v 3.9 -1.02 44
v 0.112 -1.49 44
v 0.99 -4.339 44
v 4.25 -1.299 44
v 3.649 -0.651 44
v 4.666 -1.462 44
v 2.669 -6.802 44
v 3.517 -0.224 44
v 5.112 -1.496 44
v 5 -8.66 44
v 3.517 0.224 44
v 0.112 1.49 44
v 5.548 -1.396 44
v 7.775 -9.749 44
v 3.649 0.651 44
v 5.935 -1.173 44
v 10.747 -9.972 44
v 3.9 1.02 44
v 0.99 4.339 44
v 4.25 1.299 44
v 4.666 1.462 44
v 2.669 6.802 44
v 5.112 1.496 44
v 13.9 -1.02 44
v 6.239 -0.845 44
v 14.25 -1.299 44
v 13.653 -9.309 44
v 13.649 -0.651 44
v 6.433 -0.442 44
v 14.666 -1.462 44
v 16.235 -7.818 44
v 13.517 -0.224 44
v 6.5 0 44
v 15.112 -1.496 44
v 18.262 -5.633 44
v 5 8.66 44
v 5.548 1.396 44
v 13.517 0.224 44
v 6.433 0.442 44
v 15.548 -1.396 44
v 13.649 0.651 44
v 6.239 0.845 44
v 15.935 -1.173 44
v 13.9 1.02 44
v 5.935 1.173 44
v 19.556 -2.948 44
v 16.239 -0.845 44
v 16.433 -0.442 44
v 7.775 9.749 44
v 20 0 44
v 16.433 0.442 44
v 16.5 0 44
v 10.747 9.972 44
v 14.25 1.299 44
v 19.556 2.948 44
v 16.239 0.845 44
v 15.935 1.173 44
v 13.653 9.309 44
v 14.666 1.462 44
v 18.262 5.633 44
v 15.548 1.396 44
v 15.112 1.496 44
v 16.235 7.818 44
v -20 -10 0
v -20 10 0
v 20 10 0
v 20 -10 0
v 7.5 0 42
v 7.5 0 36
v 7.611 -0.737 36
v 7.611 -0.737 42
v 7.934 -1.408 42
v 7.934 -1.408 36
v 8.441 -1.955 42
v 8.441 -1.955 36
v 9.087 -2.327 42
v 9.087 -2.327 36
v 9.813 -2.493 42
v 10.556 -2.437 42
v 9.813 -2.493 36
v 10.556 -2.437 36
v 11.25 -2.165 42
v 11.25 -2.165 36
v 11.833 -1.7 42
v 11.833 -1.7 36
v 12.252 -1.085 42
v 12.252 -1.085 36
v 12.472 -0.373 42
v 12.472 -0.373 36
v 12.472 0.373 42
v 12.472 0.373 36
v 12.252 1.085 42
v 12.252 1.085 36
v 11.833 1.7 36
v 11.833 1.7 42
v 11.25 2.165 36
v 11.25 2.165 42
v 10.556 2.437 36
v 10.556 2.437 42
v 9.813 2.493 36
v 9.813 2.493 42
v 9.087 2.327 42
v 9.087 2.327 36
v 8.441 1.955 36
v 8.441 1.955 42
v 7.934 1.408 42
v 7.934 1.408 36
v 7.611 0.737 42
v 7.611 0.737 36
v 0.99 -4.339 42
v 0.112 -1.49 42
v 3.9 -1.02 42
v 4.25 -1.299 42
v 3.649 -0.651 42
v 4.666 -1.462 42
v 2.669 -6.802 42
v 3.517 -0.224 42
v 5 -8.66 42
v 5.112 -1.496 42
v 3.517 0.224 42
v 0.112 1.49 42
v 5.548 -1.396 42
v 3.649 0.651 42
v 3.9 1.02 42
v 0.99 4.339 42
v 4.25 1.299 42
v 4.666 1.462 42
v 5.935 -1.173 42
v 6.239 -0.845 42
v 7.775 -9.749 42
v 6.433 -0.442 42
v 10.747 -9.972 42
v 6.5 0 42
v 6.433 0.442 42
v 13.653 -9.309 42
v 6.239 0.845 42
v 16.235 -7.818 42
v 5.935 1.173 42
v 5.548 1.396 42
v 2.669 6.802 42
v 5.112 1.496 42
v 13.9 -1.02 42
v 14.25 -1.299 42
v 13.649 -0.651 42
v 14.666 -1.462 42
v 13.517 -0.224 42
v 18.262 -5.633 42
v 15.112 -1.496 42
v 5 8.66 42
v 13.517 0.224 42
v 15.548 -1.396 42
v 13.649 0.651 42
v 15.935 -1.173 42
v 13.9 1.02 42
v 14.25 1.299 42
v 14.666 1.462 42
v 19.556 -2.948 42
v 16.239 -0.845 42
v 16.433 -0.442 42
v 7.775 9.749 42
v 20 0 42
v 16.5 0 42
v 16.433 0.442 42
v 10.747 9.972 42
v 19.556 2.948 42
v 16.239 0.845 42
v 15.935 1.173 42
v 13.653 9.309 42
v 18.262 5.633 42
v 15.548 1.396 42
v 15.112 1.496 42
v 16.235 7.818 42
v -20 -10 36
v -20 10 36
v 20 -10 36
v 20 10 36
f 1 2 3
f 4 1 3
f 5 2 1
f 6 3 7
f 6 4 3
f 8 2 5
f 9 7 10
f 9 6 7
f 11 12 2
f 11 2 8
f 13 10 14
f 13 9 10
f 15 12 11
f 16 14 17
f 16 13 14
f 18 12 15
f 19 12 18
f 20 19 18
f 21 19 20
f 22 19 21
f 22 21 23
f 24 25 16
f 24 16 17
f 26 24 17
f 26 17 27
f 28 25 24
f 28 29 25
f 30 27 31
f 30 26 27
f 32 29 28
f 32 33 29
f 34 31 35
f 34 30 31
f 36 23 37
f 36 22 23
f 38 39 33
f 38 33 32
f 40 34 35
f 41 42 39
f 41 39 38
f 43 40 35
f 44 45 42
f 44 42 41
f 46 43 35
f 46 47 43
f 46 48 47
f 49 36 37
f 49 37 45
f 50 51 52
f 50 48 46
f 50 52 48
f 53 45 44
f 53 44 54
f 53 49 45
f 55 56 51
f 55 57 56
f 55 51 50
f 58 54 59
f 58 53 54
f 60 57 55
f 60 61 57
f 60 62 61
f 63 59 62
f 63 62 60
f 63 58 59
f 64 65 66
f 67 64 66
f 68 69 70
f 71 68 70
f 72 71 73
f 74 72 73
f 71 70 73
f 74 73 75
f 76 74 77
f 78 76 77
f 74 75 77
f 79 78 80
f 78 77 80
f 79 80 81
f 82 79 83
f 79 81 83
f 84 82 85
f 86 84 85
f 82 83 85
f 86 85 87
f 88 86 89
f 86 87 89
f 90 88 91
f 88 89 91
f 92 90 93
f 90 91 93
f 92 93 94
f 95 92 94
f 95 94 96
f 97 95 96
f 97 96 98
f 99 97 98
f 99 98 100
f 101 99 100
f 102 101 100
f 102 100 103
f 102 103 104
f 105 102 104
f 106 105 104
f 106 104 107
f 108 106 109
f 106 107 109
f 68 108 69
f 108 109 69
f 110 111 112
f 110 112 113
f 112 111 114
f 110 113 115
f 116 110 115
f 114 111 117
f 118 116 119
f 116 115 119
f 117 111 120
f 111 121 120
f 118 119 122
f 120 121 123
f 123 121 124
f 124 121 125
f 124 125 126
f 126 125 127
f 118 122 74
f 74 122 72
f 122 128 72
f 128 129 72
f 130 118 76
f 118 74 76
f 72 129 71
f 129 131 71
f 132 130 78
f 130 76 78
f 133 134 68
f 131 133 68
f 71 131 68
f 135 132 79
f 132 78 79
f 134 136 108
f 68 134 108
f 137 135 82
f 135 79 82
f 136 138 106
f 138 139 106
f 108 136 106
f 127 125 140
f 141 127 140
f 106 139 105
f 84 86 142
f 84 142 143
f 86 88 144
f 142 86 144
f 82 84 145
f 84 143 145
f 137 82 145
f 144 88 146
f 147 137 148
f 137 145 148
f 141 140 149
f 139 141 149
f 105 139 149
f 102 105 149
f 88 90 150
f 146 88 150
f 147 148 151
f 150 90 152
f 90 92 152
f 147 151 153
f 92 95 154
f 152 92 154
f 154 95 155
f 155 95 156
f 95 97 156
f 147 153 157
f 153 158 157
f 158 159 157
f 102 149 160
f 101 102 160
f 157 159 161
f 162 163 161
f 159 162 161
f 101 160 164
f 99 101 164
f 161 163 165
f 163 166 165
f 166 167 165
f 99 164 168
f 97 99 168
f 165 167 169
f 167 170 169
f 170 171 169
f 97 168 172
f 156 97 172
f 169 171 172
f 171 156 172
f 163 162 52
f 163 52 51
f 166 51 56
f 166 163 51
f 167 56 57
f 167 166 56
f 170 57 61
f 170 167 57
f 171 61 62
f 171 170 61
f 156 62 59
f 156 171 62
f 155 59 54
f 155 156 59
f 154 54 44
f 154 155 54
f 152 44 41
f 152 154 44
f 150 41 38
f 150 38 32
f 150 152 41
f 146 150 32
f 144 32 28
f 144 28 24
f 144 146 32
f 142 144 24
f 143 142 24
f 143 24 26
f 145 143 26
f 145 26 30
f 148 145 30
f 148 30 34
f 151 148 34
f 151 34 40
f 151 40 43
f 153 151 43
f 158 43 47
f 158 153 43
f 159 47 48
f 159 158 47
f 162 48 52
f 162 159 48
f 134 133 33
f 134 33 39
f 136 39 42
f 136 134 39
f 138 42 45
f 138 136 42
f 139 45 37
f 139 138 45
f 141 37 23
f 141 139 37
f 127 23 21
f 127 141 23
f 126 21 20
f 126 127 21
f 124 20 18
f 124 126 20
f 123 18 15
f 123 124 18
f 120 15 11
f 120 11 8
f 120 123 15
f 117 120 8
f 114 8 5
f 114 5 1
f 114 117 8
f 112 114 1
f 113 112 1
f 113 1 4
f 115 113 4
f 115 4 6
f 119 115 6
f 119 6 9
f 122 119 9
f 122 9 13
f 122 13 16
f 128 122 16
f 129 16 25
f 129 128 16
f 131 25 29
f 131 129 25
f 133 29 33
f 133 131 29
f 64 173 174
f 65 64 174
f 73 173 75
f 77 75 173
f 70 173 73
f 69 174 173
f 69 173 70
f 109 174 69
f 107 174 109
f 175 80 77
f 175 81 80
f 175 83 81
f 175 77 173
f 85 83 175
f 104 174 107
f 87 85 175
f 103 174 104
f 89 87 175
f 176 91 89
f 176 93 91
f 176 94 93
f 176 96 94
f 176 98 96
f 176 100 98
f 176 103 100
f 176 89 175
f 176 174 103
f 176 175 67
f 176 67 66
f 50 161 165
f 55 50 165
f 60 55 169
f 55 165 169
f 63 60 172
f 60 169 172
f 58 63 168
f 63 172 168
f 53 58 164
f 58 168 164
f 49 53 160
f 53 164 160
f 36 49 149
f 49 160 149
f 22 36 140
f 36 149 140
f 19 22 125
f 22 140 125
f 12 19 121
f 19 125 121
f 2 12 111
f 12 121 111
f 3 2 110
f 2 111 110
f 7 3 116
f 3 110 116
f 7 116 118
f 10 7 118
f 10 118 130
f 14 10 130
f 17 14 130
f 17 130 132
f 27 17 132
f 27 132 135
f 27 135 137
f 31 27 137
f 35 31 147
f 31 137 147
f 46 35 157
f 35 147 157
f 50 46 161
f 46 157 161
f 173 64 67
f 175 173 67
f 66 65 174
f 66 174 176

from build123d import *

# Parameters (mm, degrees)
SKETCH_1_W      = 40
SKETCH_1_H      = 20
EXTRUDE_1_DEPTH = 36
SKETCH_2_R      = 2.5
EXTRUDE_2_DEPTH = 6
SKETCH_4_R      = 10
SKETCH_4_R_2    = 1.5
EXTRUDE_3_DEPTH = 2


with BuildPart() as part:
    # Эскиз1 → Бобышка-Вытянуть1 (new body)
    with BuildSketch(Plane.XY):
        Rectangle(SKETCH_1_W, SKETCH_1_H)
    extrude(amount=EXTRUDE_1_DEPTH)

    # Эскиз2 → Бобышка-Вытянуть2 (add)
    with BuildSketch(Plane.XY.offset(36)):
        with Locations(Location((10, 0, 0), (0, 0, 180))):
            Circle(SKETCH_2_R)
    extrude(amount=EXTRUDE_2_DEPTH)

    # Эскиз4 → Бобышка-Вытянуть3 (add)
    with BuildSketch(Plane.XY.offset(42)):
        with Locations((10, 0)):
            Circle(SKETCH_4_R)
        with Locations((5, 0)):
            Circle(SKETCH_4_R_2, mode=Mode.SUBTRACT)
        with Locations((15, 0)):
            Circle(SKETCH_4_R_2, mode=Mode.SUBTRACT)
    extrude(amount=EXTRUDE_3_DEPTH)


solid = part.part
